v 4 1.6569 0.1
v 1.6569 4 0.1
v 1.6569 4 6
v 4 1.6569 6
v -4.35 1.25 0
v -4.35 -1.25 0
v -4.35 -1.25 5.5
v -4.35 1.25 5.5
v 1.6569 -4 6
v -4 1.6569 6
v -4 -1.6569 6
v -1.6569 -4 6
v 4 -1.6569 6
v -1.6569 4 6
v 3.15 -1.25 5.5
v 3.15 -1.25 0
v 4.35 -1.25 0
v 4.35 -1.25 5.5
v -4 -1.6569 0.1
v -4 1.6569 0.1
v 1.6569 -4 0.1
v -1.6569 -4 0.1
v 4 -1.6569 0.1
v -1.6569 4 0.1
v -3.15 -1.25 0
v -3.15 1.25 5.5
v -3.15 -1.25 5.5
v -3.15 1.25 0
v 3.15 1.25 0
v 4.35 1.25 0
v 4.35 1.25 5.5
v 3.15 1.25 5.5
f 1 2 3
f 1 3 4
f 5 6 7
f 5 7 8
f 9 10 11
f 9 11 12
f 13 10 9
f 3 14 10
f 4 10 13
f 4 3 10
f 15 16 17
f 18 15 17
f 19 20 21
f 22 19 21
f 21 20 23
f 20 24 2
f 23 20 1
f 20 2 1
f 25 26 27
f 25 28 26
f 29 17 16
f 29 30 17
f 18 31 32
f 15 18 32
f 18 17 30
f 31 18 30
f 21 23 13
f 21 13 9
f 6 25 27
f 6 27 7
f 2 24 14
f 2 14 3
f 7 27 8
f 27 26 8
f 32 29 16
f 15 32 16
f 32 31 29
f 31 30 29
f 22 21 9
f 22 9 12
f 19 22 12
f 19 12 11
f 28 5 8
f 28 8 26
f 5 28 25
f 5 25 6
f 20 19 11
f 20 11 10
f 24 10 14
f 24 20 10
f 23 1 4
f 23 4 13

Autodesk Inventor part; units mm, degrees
ref_plane "YZ Plane" through (0, 0, 0) normal (1, 0, 0) x (0, 1, 0)
ref_plane "XZ Plane" through (0, 0, 0) normal (0, 1, 0) x (-1, 0, 0)
ref_plane "XY Plane" through (0, 0, 0) normal (0, 0, 1) x (1, 0, 0)
sketch "Sketch1" plane through (0, 0, 0) normal (0, 0, 1) x (1, 0, 0)
  line L0 (-1.6569, 4) -> (1.6569, 4)
  line L1 (1.6569, 4) -> (4, 1.6569)
  line L2 (4, 1.6569) -> (4, -1.6569)
  line L3 (4, -1.6569) -> (1.6569, -4)
  line L4 (1.6569, -4) -> (-1.6569, -4)
  line L5 (-1.6569, -4) -> (-4, -1.6569)
  line L6 (-4, -1.6569) -> (-4, 1.6569)
  line L7 (-4, 1.6569) -> (-1.6569, 4)
  point P0 (0, 0)
  point P1 (0, 0)
  dimension "d0" = 8
extrude "Extrusion1" add sketch "Sketch1" along normal blind 6
sketch "Sketch2" plane through (0, 0, 0) normal (0, 0, -1) x (-1, 0, 0)
  line L0 (-3.15, -1.25) -> (-4.35, -1.25)
  line L1 (-4.35, -1.25) -> (-4.35, 1.25)
  line L2 (-4.35, 1.25) -> (-3.15, 1.25)
  line L3 (-3.15, 1.25) -> (-3.15, -1.25)
  line L4 (-3.15, -1.25) -> (-4.35, 1.25) construction
  line L5 (-4.35, -1.25) -> (-3.15, 1.25) construction
  line L6 (3.15, -1.25) -> (4.35, -1.25)
  line L7 (4.35, -1.25) -> (4.35, 1.25)
  line L8 (4.35, 1.25) -> (3.15, 1.25)
  line L9 (3.15, 1.25) -> (3.15, -1.25)
  line L10 (3.15, -1.25) -> (4.35, 1.25) construction
  line L11 (4.35, -1.25) -> (3.15, 1.25) construction
  line L12 (0, -5.6) -> (0, 5.6) projected
  line L13 (6.09, 0) -> (-6.09, 0) projected
  point P0 (0, 0)
  point P1 (-3.75, 0)
  point P2 (3.75, 0)
  point P3 (-3.75, 0)
  point P4 (3.75, 0)
  dimension "d3" = 6.3
  dimension "d4" = 1.2
  dimension "d5" = 2.5
extrude "Extrusion2" add sketch "Sketch2" against normal blind 5.5 separate body
thicken "Thicken1" operation add thickness 0.1 both sides no extend neighbours yes toward (0, 0, 1) bodies 1 faces at (-0.2288, 0.5523, 0)
properties part number "CDRH8D58LD"
